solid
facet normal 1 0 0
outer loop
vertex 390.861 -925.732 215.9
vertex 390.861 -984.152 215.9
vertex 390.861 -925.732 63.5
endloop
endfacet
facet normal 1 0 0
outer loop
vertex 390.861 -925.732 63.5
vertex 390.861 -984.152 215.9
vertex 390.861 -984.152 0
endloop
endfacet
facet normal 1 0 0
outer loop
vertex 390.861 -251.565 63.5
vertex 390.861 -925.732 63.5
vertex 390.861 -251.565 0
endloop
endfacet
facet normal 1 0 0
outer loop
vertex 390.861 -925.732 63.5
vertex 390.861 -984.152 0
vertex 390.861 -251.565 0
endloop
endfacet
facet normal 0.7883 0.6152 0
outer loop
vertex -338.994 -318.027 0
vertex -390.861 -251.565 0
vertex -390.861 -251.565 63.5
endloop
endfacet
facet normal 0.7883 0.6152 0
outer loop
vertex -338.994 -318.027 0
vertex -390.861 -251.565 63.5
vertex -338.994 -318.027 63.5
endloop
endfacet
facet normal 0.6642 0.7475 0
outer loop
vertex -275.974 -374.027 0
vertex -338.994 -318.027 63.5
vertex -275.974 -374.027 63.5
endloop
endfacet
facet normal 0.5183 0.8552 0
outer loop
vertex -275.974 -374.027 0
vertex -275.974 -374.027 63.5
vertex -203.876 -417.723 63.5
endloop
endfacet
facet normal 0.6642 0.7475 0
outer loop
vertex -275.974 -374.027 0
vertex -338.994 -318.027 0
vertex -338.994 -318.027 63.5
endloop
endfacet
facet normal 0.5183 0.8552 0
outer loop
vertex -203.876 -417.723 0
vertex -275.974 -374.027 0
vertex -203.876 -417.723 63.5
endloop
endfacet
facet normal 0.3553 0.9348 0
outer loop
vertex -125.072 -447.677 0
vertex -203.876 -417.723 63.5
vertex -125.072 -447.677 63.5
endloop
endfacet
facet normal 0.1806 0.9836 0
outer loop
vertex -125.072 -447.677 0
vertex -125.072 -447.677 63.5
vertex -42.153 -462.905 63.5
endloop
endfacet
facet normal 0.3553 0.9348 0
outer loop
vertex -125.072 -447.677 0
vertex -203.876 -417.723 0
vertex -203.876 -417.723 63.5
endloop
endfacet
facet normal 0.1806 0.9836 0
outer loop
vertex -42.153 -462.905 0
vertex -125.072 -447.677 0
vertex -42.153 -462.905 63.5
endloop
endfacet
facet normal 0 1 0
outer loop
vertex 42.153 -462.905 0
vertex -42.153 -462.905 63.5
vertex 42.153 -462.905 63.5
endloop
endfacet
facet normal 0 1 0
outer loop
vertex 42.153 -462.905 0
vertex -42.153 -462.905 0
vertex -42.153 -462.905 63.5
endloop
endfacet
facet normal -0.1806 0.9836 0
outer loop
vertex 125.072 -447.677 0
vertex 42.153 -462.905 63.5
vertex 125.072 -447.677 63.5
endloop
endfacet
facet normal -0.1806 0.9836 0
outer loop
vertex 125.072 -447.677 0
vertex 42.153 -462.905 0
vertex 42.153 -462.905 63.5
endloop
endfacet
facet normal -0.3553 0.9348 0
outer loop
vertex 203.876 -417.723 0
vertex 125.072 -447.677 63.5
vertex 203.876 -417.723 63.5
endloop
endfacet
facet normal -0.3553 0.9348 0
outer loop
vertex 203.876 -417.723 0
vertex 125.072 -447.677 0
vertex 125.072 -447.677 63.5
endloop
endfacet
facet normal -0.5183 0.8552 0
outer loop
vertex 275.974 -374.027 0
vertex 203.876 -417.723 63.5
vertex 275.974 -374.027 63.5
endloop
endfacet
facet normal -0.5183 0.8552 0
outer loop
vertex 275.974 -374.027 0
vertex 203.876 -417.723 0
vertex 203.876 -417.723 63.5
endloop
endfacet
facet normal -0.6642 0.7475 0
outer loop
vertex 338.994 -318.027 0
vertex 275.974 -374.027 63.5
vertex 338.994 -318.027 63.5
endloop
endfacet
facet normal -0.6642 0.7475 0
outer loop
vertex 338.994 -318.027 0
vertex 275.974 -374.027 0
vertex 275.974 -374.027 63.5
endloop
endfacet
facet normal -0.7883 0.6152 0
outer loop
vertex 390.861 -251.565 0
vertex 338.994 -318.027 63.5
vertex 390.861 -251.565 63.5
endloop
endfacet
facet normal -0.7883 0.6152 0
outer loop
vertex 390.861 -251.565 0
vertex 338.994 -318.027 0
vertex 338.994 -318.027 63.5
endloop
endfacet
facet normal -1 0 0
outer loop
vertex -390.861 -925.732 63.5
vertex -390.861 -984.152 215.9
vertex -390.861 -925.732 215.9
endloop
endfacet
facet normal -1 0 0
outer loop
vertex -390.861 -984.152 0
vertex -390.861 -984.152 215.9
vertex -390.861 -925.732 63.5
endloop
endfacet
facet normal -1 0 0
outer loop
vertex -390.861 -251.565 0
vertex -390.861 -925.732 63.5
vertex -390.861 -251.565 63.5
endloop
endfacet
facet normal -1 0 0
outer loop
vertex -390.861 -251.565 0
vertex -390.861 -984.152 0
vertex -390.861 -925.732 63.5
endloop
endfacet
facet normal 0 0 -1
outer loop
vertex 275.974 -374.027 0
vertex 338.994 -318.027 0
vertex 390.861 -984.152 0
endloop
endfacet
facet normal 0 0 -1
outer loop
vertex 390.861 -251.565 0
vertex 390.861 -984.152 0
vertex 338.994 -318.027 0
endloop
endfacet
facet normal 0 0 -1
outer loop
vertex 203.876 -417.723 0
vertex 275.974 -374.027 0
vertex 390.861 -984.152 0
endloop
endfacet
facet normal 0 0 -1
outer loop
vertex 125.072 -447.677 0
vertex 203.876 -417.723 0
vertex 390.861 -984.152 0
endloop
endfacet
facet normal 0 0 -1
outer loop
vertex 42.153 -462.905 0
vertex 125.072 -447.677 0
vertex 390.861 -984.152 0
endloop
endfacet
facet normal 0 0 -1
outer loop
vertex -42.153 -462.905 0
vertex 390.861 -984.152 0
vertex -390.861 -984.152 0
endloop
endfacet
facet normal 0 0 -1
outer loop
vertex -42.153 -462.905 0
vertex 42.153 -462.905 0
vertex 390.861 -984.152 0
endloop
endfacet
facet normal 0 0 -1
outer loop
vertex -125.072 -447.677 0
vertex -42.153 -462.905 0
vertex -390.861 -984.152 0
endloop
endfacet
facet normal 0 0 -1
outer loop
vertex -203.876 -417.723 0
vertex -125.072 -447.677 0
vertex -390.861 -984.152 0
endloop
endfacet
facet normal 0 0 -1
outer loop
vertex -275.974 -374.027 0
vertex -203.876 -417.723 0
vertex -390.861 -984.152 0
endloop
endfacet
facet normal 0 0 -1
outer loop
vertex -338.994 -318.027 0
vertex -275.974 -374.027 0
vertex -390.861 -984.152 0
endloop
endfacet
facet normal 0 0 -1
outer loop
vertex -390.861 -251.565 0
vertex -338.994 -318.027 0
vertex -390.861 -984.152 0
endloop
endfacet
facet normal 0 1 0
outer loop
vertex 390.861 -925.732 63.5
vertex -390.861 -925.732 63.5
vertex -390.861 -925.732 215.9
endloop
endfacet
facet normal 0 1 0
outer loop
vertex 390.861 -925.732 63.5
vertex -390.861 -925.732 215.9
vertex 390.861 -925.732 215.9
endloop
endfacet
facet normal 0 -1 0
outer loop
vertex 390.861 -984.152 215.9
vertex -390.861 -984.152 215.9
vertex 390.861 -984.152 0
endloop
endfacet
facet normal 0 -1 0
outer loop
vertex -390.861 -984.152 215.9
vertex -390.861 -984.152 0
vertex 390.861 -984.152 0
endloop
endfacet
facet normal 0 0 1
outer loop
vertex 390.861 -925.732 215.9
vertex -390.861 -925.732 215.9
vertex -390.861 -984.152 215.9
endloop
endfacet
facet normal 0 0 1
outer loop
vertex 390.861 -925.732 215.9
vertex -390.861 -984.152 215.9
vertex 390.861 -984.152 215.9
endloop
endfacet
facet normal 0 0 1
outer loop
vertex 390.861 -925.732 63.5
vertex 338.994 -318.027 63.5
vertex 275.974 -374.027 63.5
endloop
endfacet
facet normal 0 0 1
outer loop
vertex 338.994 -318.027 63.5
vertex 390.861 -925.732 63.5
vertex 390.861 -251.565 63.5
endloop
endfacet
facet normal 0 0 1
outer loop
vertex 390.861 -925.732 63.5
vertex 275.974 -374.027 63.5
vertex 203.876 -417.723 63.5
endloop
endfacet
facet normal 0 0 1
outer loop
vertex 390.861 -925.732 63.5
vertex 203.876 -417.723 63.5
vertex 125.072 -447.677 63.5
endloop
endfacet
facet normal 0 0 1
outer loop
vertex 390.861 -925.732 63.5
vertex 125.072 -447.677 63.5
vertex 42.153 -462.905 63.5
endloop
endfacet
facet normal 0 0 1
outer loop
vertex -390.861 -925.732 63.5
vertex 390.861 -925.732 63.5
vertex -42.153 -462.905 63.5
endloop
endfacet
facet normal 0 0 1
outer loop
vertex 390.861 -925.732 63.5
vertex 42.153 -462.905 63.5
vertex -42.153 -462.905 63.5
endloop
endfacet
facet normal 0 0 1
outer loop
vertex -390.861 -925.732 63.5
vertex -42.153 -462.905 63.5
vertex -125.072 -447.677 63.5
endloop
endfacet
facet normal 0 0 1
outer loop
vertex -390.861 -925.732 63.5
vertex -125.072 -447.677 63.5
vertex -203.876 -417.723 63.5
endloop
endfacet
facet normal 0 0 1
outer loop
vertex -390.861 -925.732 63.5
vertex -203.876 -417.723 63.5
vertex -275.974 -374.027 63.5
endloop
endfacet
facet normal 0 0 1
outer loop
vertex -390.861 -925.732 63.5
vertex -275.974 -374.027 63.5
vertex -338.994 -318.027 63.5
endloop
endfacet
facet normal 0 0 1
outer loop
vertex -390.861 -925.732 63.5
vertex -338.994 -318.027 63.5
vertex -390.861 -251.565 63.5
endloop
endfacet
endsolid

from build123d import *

# Parameters (mm, degrees)
BOSS_EXTRUDE1_DEPTH = 63.5
SKETCH3_W           = 781.722843432
SKETCH3_H           = 58.42
BOSS_EXTRUDE2_DEPTH = 152.4


with BuildPart() as part:
    # Sketch2 → Boss-Extrude1 (new body)
    with BuildSketch(Plane.XY):
        with BuildLine():
            Line((390.861421716, -251.565063977), (390.861421716, -984.152448319))
            Line((390.861421716, -984.152448319), (-390.861421716, -984.152448319))
            Line((-390.861421716, -984.152448319), (-390.861421716, -251.565063977))
            ThreePointArc((-390.861421716, -251.565063977), (0, -464.82), (390.861421716, -251.565063977))
        make_face()
    extrude(amount=BOSS_EXTRUDE1_DEPTH)

    # Sketch3 → Boss-Extrude2 (add)
    with BuildSketch(Plane.XY.offset(63.5)):
        with Locations((0, -954.942448319)):
            Rectangle(SKETCH3_W, SKETCH3_H)
    extrude(amount=BOSS_EXTRUDE2_DEPTH)


solid = part.part
